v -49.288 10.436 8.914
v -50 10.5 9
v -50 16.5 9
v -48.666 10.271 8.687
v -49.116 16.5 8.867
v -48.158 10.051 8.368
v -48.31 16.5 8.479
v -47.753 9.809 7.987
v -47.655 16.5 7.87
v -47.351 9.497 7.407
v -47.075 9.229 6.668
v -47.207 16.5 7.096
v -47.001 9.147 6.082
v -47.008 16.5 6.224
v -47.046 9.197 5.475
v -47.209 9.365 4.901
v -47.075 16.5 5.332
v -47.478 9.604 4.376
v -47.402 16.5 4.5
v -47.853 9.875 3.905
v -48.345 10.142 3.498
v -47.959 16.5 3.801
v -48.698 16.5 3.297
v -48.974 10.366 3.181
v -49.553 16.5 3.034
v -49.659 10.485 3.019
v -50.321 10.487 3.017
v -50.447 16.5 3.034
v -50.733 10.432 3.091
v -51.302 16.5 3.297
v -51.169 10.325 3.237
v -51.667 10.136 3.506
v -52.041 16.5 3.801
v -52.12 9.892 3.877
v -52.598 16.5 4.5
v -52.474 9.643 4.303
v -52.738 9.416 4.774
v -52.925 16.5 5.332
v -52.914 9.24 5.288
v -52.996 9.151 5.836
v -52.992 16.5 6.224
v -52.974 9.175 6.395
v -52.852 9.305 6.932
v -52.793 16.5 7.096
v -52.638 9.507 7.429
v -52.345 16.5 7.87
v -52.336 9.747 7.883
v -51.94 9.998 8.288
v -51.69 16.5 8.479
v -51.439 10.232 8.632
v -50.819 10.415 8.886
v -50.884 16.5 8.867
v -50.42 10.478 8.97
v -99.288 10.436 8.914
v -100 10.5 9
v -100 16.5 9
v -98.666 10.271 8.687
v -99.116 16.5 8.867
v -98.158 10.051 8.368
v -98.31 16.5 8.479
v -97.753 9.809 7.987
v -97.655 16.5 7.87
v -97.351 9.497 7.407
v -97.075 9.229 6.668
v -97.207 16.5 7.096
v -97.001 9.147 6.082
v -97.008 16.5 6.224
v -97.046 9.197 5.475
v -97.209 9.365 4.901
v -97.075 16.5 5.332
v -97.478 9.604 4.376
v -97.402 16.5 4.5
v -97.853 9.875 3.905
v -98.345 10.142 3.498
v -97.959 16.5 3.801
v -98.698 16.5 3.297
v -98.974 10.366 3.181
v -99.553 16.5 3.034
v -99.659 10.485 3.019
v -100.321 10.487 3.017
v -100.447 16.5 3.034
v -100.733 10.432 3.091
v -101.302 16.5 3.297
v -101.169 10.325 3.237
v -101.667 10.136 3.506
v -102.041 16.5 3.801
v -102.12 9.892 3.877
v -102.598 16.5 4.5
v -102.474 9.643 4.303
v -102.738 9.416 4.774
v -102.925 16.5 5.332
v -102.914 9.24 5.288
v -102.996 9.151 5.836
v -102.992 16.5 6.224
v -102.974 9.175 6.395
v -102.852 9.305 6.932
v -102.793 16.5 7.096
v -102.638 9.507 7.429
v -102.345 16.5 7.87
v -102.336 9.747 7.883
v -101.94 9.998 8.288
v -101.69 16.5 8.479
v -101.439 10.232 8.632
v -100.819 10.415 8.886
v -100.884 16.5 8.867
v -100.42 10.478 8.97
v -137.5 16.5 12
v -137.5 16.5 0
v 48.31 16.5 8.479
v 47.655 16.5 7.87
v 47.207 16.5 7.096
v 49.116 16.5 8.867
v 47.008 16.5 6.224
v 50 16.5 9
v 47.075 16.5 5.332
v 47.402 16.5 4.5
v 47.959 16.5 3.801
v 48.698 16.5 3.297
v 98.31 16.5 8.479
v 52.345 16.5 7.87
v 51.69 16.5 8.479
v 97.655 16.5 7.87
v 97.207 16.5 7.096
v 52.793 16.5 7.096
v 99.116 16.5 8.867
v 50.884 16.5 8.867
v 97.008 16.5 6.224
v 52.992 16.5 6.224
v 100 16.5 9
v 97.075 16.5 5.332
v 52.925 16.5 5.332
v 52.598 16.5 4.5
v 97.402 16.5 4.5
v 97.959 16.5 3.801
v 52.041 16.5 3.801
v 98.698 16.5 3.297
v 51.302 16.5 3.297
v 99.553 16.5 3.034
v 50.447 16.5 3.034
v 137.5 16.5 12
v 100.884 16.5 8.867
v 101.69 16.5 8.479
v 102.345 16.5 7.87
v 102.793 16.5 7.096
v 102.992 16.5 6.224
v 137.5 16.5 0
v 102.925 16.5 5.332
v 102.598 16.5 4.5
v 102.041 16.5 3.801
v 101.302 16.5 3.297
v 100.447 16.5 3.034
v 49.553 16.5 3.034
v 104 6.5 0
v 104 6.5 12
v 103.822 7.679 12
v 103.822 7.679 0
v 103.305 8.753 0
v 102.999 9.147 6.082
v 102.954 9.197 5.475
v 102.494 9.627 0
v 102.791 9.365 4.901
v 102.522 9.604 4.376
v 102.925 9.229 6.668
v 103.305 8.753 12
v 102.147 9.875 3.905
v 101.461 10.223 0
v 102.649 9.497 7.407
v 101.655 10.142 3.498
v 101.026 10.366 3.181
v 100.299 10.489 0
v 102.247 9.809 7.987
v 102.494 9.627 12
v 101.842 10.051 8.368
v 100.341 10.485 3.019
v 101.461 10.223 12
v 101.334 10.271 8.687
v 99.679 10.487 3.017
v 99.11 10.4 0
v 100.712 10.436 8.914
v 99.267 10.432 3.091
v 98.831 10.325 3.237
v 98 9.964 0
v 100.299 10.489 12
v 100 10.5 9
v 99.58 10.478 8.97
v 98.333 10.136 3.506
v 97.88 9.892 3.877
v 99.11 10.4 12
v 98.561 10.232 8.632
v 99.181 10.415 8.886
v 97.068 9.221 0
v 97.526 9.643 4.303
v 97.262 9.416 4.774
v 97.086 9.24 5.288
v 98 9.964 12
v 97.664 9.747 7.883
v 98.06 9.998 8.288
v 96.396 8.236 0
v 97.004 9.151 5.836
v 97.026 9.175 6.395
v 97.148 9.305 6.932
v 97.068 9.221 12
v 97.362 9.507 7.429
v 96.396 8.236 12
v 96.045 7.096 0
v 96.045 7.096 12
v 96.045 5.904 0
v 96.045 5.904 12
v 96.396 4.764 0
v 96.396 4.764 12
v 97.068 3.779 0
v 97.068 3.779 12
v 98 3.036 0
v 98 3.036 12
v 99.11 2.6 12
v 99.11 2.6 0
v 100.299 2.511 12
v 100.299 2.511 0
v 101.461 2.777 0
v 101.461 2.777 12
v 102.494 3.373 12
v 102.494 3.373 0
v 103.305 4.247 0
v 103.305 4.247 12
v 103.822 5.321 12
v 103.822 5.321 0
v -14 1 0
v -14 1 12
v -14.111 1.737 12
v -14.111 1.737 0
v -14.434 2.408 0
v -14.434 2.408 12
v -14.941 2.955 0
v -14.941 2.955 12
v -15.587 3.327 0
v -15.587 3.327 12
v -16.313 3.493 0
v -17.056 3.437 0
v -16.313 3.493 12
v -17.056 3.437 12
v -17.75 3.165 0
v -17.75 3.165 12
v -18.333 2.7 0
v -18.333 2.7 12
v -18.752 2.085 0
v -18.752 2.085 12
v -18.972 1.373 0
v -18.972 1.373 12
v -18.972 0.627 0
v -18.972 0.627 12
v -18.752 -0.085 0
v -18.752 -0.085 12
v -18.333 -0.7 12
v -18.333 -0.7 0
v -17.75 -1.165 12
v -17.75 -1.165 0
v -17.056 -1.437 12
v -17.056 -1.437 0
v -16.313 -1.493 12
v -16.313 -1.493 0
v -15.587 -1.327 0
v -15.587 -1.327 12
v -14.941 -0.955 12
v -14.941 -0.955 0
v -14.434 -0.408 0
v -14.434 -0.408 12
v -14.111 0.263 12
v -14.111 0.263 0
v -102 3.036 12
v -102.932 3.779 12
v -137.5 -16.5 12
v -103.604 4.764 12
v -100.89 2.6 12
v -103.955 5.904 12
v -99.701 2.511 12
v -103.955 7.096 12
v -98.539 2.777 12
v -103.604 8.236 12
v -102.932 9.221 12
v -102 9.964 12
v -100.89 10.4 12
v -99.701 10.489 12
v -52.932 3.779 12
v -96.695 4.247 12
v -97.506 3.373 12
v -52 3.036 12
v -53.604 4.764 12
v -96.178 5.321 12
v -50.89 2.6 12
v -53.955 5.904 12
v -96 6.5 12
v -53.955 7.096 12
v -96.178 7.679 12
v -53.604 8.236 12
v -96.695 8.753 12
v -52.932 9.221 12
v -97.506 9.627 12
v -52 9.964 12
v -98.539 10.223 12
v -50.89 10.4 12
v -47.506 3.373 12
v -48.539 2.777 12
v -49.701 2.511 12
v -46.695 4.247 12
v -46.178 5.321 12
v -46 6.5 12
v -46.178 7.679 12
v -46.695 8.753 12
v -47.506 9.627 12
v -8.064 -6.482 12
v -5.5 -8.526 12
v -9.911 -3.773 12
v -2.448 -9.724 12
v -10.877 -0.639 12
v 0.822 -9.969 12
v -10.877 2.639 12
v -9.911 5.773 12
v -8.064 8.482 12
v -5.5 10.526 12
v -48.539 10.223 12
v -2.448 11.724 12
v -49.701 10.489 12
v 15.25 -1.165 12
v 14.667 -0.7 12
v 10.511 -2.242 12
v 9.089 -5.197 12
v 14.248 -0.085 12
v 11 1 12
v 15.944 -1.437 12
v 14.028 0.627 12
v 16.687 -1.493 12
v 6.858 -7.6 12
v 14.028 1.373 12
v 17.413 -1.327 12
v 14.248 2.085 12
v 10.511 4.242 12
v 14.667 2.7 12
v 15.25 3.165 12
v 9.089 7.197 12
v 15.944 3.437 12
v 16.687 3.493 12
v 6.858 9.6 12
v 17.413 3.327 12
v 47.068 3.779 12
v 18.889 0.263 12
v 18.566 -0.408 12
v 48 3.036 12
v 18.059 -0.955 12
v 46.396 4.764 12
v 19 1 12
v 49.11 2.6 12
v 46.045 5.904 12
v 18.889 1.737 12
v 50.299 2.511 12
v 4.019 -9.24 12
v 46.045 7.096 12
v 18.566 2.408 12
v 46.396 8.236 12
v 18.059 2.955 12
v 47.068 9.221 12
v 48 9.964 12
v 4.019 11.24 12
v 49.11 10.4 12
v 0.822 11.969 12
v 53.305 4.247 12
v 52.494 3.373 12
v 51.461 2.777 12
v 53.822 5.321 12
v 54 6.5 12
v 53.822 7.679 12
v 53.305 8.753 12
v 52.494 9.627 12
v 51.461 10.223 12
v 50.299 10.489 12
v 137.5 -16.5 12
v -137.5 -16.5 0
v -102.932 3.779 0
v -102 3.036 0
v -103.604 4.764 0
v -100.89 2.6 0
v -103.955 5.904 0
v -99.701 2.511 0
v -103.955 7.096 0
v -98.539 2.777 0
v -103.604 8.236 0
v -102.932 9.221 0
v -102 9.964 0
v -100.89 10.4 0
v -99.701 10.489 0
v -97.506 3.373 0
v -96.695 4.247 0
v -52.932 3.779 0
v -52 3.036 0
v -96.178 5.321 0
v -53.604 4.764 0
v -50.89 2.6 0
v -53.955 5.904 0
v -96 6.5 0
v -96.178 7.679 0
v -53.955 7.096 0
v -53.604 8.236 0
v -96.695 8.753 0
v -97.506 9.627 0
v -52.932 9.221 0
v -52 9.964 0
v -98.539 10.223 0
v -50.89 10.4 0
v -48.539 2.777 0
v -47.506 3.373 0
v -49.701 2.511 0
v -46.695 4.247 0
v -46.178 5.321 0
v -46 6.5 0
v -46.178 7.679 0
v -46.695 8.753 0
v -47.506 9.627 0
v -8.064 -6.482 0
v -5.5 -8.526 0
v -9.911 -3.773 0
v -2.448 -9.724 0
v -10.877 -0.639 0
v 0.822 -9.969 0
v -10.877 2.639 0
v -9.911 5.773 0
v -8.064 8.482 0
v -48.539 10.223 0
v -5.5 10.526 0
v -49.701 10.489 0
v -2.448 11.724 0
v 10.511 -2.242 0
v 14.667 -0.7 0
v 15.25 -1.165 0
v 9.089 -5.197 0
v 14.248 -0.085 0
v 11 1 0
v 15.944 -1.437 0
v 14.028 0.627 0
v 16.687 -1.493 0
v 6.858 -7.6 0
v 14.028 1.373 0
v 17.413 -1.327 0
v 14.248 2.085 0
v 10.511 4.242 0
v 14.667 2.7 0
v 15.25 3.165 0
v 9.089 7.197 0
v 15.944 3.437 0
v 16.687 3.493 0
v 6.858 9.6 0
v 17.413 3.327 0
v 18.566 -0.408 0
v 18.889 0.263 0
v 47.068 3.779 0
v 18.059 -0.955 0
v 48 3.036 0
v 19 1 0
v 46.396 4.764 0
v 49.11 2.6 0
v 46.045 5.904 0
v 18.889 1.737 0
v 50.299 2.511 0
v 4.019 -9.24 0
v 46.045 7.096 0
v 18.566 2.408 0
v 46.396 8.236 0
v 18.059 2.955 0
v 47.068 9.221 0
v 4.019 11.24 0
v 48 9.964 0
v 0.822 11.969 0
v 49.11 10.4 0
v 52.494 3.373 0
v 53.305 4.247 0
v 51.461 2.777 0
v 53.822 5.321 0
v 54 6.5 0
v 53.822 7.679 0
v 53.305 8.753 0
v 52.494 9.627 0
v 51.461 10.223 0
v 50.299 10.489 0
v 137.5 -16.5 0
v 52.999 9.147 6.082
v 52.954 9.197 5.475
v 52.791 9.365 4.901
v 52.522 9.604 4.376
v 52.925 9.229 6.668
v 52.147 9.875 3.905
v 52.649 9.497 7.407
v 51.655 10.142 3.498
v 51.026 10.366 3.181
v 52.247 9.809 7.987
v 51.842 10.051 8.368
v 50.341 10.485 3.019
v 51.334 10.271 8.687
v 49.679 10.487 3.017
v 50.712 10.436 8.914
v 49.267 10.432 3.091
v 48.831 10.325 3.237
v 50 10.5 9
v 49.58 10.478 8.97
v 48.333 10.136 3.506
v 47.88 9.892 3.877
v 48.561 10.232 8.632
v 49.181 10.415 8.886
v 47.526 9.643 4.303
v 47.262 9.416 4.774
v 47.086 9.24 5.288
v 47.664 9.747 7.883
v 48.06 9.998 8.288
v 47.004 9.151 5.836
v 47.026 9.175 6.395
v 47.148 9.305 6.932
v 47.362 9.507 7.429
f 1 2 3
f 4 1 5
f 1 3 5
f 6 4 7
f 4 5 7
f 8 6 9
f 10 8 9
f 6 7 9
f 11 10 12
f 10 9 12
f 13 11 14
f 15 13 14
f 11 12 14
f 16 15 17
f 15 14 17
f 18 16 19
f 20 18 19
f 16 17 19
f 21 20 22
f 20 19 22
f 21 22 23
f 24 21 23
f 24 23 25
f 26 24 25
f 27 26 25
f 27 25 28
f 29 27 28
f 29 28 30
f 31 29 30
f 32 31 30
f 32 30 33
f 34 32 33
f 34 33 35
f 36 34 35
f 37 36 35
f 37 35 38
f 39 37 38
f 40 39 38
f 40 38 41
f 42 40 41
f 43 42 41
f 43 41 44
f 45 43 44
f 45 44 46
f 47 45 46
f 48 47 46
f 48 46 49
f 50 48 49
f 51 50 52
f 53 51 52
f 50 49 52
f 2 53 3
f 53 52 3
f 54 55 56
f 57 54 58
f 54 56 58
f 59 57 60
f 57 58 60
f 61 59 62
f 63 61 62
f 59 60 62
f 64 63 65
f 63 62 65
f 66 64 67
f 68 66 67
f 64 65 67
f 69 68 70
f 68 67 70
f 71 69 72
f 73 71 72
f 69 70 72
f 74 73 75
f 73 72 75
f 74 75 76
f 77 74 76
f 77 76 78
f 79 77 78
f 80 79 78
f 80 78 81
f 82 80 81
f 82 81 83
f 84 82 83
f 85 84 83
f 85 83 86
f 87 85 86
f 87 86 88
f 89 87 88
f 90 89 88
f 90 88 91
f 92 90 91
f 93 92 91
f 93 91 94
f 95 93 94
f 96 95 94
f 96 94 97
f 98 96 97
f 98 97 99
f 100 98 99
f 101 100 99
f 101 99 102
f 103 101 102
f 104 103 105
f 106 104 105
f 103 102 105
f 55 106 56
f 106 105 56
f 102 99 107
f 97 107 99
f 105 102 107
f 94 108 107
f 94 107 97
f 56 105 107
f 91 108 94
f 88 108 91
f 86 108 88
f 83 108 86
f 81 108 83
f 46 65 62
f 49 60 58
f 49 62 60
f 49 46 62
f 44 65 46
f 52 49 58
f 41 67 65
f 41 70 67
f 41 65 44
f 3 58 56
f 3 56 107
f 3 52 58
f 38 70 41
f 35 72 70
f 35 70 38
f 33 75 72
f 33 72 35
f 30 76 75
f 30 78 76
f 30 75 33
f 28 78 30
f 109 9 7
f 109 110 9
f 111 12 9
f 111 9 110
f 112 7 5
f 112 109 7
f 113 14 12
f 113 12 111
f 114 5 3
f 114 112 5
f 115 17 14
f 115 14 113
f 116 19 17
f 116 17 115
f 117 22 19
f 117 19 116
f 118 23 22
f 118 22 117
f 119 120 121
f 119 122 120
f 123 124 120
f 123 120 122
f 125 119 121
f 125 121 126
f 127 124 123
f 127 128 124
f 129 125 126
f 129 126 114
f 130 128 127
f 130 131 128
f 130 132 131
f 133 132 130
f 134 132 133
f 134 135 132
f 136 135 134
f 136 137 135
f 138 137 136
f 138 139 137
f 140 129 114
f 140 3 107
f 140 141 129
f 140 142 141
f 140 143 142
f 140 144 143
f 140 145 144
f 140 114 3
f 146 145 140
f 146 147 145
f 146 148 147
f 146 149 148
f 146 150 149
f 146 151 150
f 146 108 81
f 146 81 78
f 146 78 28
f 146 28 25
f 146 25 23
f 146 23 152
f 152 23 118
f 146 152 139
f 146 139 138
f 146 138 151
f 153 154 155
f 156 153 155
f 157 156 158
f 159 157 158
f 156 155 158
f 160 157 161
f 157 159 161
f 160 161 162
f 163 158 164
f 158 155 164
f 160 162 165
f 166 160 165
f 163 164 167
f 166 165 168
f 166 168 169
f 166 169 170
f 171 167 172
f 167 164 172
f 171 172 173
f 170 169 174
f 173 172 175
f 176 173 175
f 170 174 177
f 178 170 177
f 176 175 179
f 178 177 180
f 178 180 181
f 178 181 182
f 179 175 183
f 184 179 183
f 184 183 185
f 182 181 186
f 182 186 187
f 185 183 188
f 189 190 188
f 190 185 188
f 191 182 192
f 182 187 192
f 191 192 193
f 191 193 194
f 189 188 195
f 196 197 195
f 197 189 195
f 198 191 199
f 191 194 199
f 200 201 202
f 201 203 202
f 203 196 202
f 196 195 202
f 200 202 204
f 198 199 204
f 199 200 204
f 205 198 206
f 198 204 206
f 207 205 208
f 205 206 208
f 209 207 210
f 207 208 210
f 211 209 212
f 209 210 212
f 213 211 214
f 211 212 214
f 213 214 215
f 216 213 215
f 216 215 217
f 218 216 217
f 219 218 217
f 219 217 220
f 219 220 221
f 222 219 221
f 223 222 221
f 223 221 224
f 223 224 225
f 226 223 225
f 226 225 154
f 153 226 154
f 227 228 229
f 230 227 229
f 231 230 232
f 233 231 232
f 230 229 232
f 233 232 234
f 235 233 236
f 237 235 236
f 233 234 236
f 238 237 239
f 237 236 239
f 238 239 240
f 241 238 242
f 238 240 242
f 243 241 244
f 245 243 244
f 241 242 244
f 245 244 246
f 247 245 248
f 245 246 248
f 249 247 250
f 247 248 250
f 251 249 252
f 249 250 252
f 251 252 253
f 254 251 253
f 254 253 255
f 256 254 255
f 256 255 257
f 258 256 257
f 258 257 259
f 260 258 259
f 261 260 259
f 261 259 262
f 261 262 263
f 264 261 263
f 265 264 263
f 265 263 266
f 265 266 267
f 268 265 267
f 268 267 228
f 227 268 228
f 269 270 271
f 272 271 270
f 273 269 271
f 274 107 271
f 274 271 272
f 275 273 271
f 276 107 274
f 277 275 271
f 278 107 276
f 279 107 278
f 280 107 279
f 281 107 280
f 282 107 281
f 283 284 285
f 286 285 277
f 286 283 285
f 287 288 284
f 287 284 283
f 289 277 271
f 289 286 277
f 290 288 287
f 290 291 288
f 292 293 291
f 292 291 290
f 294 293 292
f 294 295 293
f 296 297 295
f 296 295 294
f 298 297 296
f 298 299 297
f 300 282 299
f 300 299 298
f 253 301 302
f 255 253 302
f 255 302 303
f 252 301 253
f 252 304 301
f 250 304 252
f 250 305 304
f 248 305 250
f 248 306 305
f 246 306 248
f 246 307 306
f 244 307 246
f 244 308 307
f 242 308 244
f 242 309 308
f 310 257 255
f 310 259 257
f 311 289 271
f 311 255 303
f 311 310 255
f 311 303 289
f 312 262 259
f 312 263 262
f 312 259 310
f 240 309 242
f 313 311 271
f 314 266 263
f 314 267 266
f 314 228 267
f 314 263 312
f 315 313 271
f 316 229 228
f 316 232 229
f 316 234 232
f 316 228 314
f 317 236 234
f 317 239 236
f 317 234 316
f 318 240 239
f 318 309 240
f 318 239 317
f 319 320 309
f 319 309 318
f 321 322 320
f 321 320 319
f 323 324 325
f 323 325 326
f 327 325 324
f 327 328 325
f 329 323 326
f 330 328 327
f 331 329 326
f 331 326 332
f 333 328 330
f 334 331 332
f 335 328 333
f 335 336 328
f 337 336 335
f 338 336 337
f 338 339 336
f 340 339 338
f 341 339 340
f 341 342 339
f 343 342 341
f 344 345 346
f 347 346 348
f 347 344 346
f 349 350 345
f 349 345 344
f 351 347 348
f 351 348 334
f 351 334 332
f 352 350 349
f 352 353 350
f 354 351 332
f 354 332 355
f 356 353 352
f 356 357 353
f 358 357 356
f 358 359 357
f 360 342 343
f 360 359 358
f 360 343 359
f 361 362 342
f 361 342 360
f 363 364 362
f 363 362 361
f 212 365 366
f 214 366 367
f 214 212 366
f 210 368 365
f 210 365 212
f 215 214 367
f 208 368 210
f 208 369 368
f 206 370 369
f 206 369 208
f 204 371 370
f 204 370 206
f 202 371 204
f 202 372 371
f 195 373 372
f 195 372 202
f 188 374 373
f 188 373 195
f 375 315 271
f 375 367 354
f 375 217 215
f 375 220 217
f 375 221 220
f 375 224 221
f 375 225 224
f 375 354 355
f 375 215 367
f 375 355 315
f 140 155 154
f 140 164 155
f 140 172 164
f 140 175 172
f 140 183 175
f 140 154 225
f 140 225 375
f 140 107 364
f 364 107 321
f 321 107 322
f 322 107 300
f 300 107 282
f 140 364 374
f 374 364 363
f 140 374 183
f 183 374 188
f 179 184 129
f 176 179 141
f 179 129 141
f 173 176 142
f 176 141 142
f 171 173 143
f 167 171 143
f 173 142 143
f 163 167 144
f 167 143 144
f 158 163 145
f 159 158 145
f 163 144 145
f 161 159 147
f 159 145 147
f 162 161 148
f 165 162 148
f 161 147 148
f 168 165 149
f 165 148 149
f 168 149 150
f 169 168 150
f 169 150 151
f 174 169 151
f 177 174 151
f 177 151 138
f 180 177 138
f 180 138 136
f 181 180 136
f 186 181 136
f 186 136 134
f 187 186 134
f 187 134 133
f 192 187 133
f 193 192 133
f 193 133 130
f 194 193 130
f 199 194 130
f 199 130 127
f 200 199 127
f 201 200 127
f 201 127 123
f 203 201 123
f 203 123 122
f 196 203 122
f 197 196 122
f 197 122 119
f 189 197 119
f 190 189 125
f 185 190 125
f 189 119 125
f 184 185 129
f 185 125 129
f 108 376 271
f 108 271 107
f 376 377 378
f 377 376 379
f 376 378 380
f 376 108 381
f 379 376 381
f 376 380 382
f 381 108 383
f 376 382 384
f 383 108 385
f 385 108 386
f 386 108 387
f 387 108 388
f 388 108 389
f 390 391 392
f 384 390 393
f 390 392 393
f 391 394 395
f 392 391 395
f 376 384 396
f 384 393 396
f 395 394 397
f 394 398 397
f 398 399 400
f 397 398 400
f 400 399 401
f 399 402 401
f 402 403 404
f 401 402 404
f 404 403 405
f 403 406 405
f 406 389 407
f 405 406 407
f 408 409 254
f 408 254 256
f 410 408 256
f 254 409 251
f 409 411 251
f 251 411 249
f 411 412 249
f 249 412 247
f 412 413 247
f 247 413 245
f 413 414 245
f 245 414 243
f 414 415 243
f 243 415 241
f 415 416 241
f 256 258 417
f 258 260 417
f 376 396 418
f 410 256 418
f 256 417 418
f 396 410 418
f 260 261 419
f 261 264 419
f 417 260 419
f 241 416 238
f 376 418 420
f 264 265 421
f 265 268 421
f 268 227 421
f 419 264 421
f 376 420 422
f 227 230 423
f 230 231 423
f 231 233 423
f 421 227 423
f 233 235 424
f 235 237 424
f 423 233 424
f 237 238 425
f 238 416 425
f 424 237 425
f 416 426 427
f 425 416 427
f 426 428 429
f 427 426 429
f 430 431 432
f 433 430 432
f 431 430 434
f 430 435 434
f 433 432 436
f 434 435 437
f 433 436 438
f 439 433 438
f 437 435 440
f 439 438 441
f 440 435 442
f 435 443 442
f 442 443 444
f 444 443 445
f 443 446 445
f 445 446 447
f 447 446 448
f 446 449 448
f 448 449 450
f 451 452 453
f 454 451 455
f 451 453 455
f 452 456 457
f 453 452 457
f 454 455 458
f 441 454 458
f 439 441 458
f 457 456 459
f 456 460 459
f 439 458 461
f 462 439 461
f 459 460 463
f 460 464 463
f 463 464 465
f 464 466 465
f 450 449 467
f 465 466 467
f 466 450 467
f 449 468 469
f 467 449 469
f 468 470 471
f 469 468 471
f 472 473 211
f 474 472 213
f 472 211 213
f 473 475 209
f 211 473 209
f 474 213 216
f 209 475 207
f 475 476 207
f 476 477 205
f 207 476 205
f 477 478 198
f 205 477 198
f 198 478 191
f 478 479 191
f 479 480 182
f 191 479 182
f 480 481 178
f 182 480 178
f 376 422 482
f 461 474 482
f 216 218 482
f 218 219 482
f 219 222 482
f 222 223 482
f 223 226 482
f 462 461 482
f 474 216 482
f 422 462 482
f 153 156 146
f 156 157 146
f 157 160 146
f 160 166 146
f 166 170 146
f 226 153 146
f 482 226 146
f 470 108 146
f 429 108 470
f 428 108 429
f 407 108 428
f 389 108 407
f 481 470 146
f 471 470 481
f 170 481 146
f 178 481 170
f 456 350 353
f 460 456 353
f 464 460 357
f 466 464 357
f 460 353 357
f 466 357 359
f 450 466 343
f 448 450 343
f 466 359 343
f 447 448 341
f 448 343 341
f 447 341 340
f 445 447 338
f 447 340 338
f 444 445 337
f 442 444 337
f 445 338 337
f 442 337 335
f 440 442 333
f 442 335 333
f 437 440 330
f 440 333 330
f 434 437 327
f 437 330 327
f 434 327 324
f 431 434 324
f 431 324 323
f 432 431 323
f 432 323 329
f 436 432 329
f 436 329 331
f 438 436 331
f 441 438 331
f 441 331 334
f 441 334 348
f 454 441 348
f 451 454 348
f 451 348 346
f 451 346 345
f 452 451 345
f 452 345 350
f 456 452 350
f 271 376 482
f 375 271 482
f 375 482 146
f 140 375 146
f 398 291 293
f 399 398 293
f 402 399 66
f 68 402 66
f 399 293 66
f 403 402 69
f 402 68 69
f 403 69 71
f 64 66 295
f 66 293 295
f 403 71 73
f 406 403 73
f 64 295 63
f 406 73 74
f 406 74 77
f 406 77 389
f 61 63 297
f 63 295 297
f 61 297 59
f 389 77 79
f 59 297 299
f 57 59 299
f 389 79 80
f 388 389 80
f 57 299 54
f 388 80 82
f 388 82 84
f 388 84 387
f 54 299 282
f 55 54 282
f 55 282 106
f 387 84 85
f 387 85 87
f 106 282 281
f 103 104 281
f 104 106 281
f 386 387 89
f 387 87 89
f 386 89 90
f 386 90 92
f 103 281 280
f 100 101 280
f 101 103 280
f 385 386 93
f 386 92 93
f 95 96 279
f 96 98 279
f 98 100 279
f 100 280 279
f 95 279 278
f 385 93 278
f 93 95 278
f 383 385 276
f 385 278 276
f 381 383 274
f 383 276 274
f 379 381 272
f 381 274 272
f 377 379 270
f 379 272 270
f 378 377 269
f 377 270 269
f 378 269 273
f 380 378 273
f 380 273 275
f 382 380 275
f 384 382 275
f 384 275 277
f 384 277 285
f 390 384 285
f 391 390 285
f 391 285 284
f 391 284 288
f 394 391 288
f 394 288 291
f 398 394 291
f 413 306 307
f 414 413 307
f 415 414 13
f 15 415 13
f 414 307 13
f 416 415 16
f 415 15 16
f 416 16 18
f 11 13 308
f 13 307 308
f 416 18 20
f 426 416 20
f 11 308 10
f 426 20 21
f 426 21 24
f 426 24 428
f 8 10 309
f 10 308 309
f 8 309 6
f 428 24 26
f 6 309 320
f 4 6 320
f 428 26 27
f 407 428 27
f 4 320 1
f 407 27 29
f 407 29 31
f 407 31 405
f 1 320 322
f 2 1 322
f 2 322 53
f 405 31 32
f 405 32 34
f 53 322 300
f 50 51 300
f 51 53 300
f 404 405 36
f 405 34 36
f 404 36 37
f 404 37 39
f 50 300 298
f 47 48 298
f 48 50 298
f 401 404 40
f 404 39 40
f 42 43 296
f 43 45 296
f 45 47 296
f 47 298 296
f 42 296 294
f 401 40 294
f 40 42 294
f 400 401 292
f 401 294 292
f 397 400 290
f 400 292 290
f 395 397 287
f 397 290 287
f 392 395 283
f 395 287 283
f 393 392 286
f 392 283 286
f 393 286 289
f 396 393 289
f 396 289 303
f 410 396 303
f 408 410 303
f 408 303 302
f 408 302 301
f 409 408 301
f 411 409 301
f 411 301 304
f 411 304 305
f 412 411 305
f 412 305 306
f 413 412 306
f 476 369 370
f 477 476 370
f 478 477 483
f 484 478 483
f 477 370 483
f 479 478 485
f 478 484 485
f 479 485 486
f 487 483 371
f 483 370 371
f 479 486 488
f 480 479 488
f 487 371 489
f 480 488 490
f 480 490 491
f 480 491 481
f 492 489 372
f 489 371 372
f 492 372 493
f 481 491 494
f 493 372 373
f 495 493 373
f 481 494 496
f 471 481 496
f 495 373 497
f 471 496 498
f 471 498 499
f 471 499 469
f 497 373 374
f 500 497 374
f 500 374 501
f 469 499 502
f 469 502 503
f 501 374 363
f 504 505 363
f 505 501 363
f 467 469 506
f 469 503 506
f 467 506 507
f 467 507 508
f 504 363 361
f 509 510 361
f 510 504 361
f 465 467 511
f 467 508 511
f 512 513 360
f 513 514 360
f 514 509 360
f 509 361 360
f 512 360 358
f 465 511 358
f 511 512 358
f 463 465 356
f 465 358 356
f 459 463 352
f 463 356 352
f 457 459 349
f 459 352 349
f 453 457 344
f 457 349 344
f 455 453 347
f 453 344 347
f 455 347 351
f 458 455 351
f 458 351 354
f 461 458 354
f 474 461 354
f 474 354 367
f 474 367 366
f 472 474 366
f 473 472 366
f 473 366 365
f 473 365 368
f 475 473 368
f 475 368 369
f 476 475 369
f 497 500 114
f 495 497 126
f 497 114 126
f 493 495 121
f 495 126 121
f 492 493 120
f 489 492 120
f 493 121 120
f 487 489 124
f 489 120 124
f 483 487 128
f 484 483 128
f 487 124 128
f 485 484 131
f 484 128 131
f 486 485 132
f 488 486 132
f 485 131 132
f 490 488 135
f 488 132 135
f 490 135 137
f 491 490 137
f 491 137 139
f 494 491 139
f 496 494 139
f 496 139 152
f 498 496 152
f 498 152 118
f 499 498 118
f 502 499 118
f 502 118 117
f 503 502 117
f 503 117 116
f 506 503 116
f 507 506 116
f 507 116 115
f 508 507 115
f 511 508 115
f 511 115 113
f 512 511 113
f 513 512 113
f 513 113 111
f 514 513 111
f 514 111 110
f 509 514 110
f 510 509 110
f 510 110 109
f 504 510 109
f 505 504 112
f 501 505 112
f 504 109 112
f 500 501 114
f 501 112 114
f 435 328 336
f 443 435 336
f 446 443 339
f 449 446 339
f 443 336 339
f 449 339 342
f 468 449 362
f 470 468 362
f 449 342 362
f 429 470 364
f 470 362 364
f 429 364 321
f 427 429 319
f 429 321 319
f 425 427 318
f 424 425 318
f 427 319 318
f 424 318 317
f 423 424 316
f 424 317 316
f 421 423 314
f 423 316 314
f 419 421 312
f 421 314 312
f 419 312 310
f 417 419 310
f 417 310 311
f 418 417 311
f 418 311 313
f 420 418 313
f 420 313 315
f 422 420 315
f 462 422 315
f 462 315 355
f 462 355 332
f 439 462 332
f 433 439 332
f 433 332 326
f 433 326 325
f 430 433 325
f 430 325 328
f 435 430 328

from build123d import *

# Parameters (mm, degrees)
SKETCH1_W           = 275
SKETCH1_H           = 33
BOSS_EXTRUDE1_DEPTH = 12
CUT_EXTRUDE1_REACH  = 141.005
SKETCH2_R           = 11
SKETCH2_R_2         = 2.5
CUT_EXTRUDE2_REACH  = 141.005
SKETCH3_R           = 4
CUT_EXTRUDE3_REACH  = 143.913
SKETCH4_R           = 3


with BuildPart() as part:
    # Sketch1 → Boss-Extrude1 (new body)
    with BuildSketch(Plane.XY):
        Rectangle(SKETCH1_W, SKETCH1_H)
    extrude(amount=BOSS_EXTRUDE1_DEPTH)

    # Sketch2 → Cut-Extrude1 (cut, up to next)
    with BuildSketch(Plane.XY.offset(12), mode=Mode.PRIVATE) as cut_extrude1_sk1:
        with Locations((0, 1)):
            Circle(SKETCH2_R)
    cut_extrude1_tool1 = extrude(cut_extrude1_sk1.sketch, amount=-CUT_EXTRUDE1_REACH, mode=Mode.PRIVATE) & part.part
    # Sketch2 → Cut-Extrude1 (cut, up to next)
    with BuildSketch(Plane.XY.offset(12), mode=Mode.PRIVATE) as cut_extrude1_sk2:
        with Locations((-16.5, 1)):
            Circle(SKETCH2_R_2)
    cut_extrude1_tool2 = extrude(cut_extrude1_sk2.sketch, amount=-CUT_EXTRUDE1_REACH, mode=Mode.PRIVATE) & part.part
    # Sketch2 → Cut-Extrude1 (cut, up to next)
    with BuildSketch(Plane.XY.offset(12), mode=Mode.PRIVATE) as cut_extrude1_sk3:
        with Locations((16.5, 1)):
            Circle(SKETCH2_R_2)
    cut_extrude1_tool3 = extrude(cut_extrude1_sk3.sketch, amount=-CUT_EXTRUDE1_REACH, mode=Mode.PRIVATE) & part.part
    add(cut_extrude1_tool1.solids().sort_by_distance((0, 1, 12))[0], mode=Mode.SUBTRACT)
    add(cut_extrude1_tool2.solids().sort_by_distance((-16.5, 1, 12))[0], mode=Mode.SUBTRACT)
    add(cut_extrude1_tool3.solids().sort_by_distance((16.5, 1, 12))[0], mode=Mode.SUBTRACT)

    # Sketch3 → Cut-Extrude2 (cut, up to next)
    with BuildSketch(Plane.XY.offset(12), mode=Mode.PRIVATE) as cut_extrude2_sk1:
        with Locations((-100, 6.5)):
            Circle(SKETCH3_R)
    cut_extrude2_tool1 = extrude(cut_extrude2_sk1.sketch, amount=-CUT_EXTRUDE2_REACH, mode=Mode.PRIVATE) & part.part
    # Sketch3 → Cut-Extrude2 (cut, up to next)
    with BuildSketch(Plane.XY.offset(12), mode=Mode.PRIVATE) as cut_extrude2_sk2:
        with Locations((-50, 6.5)):
            Circle(SKETCH3_R)
    cut_extrude2_tool2 = extrude(cut_extrude2_sk2.sketch, amount=-CUT_EXTRUDE2_REACH, mode=Mode.PRIVATE) & part.part
    # Sketch3 → Cut-Extrude2 (cut, up to next)
    with BuildSketch(Plane.XY.offset(12), mode=Mode.PRIVATE) as cut_extrude2_sk3:
        with Locations((50, 6.5)):
            Circle(SKETCH3_R)
    cut_extrude2_tool3 = extrude(cut_extrude2_sk3.sketch, amount=-CUT_EXTRUDE2_REACH, mode=Mode.PRIVATE) & part.part
    # Sketch3 → Cut-Extrude2 (cut, up to next)
    with BuildSketch(Plane.XY.offset(12), mode=Mode.PRIVATE) as cut_extrude2_sk4:
        with Locations((100, 6.5)):
            Circle(SKETCH3_R)
    cut_extrude2_tool4 = extrude(cut_extrude2_sk4.sketch, amount=-CUT_EXTRUDE2_REACH, mode=Mode.PRIVATE) & part.part
    add(cut_extrude2_tool1.solids().sort_by_distance((-100, 6.5, 12))[0], mode=Mode.SUBTRACT)
    add(cut_extrude2_tool2.solids().sort_by_distance((-50, 6.5, 12))[0], mode=Mode.SUBTRACT)
    add(cut_extrude2_tool3.solids().sort_by_distance((50, 6.5, 12))[0], mode=Mode.SUBTRACT)
    add(cut_extrude2_tool4.solids().sort_by_distance((100, 6.5, 12))[0], mode=Mode.SUBTRACT)

    # Sketch4 → Cut-Extrude3 (cut, up to next)
    with BuildSketch(Plane(origin=(0, 16.5, 0), x_dir=(1, 0, 0), z_dir=(0, 1, 0)), mode=Mode.PRIVATE) as cut_extrude3_sk1:
        with Locations(Location((-100, -6, 0), (0, 0, 270))):
            Circle(SKETCH4_R)
    cut_extrude3_tool1 = extrude(cut_extrude3_sk1.sketch, amount=-CUT_EXTRUDE3_REACH, mode=Mode.PRIVATE) & part.part
    # Sketch4 → Cut-Extrude3 (cut, up to next)
    with BuildSketch(Plane(origin=(0, 16.5, 0), x_dir=(1, 0, 0), z_dir=(0, 1, 0)), mode=Mode.PRIVATE) as cut_extrude3_sk2:
        with Locations(Location((-50, -6, 0), (0, 0, 270))):
            Circle(SKETCH4_R)
    cut_extrude3_tool2 = extrude(cut_extrude3_sk2.sketch, amount=-CUT_EXTRUDE3_REACH, mode=Mode.PRIVATE) & part.part
    # Sketch4 → Cut-Extrude3 (cut, up to next)
    with BuildSketch(Plane(origin=(0, 16.5, 0), x_dir=(1, 0, 0), z_dir=(0, 1, 0)), mode=Mode.PRIVATE) as cut_extrude3_sk3:
        with Locations(Location((50, -6, 0), (0, 0, 270))):
            Circle(SKETCH4_R)
    cut_extrude3_tool3 = extrude(cut_extrude3_sk3.sketch, amount=-CUT_EXTRUDE3_REACH, mode=Mode.PRIVATE) & part.part
    # Sketch4 → Cut-Extrude3 (cut, up to next)
    with BuildSketch(Plane(origin=(0, 16.5, 0), x_dir=(1, 0, 0), z_dir=(0, 1, 0)), mode=Mode.PRIVATE) as cut_extrude3_sk4:
        with Locations(Location((100, -6, 0), (0, 0, 270))):
            Circle(SKETCH4_R)
    cut_extrude3_tool4 = extrude(cut_extrude3_sk4.sketch, amount=-CUT_EXTRUDE3_REACH, mode=Mode.PRIVATE) & part.part
    add(cut_extrude3_tool1.solids().sort_by_distance((-100, 16.5, 6))[0], mode=Mode.SUBTRACT)
    add(cut_extrude3_tool2.solids().sort_by_distance((-50, 16.5, 6))[0], mode=Mode.SUBTRACT)
    add(cut_extrude3_tool3.solids().sort_by_distance((50, 16.5, 6))[0], mode=Mode.SUBTRACT)
    add(cut_extrude3_tool4.solids().sort_by_distance((100, 16.5, 6))[0], mode=Mode.SUBTRACT)


solid = part.part
